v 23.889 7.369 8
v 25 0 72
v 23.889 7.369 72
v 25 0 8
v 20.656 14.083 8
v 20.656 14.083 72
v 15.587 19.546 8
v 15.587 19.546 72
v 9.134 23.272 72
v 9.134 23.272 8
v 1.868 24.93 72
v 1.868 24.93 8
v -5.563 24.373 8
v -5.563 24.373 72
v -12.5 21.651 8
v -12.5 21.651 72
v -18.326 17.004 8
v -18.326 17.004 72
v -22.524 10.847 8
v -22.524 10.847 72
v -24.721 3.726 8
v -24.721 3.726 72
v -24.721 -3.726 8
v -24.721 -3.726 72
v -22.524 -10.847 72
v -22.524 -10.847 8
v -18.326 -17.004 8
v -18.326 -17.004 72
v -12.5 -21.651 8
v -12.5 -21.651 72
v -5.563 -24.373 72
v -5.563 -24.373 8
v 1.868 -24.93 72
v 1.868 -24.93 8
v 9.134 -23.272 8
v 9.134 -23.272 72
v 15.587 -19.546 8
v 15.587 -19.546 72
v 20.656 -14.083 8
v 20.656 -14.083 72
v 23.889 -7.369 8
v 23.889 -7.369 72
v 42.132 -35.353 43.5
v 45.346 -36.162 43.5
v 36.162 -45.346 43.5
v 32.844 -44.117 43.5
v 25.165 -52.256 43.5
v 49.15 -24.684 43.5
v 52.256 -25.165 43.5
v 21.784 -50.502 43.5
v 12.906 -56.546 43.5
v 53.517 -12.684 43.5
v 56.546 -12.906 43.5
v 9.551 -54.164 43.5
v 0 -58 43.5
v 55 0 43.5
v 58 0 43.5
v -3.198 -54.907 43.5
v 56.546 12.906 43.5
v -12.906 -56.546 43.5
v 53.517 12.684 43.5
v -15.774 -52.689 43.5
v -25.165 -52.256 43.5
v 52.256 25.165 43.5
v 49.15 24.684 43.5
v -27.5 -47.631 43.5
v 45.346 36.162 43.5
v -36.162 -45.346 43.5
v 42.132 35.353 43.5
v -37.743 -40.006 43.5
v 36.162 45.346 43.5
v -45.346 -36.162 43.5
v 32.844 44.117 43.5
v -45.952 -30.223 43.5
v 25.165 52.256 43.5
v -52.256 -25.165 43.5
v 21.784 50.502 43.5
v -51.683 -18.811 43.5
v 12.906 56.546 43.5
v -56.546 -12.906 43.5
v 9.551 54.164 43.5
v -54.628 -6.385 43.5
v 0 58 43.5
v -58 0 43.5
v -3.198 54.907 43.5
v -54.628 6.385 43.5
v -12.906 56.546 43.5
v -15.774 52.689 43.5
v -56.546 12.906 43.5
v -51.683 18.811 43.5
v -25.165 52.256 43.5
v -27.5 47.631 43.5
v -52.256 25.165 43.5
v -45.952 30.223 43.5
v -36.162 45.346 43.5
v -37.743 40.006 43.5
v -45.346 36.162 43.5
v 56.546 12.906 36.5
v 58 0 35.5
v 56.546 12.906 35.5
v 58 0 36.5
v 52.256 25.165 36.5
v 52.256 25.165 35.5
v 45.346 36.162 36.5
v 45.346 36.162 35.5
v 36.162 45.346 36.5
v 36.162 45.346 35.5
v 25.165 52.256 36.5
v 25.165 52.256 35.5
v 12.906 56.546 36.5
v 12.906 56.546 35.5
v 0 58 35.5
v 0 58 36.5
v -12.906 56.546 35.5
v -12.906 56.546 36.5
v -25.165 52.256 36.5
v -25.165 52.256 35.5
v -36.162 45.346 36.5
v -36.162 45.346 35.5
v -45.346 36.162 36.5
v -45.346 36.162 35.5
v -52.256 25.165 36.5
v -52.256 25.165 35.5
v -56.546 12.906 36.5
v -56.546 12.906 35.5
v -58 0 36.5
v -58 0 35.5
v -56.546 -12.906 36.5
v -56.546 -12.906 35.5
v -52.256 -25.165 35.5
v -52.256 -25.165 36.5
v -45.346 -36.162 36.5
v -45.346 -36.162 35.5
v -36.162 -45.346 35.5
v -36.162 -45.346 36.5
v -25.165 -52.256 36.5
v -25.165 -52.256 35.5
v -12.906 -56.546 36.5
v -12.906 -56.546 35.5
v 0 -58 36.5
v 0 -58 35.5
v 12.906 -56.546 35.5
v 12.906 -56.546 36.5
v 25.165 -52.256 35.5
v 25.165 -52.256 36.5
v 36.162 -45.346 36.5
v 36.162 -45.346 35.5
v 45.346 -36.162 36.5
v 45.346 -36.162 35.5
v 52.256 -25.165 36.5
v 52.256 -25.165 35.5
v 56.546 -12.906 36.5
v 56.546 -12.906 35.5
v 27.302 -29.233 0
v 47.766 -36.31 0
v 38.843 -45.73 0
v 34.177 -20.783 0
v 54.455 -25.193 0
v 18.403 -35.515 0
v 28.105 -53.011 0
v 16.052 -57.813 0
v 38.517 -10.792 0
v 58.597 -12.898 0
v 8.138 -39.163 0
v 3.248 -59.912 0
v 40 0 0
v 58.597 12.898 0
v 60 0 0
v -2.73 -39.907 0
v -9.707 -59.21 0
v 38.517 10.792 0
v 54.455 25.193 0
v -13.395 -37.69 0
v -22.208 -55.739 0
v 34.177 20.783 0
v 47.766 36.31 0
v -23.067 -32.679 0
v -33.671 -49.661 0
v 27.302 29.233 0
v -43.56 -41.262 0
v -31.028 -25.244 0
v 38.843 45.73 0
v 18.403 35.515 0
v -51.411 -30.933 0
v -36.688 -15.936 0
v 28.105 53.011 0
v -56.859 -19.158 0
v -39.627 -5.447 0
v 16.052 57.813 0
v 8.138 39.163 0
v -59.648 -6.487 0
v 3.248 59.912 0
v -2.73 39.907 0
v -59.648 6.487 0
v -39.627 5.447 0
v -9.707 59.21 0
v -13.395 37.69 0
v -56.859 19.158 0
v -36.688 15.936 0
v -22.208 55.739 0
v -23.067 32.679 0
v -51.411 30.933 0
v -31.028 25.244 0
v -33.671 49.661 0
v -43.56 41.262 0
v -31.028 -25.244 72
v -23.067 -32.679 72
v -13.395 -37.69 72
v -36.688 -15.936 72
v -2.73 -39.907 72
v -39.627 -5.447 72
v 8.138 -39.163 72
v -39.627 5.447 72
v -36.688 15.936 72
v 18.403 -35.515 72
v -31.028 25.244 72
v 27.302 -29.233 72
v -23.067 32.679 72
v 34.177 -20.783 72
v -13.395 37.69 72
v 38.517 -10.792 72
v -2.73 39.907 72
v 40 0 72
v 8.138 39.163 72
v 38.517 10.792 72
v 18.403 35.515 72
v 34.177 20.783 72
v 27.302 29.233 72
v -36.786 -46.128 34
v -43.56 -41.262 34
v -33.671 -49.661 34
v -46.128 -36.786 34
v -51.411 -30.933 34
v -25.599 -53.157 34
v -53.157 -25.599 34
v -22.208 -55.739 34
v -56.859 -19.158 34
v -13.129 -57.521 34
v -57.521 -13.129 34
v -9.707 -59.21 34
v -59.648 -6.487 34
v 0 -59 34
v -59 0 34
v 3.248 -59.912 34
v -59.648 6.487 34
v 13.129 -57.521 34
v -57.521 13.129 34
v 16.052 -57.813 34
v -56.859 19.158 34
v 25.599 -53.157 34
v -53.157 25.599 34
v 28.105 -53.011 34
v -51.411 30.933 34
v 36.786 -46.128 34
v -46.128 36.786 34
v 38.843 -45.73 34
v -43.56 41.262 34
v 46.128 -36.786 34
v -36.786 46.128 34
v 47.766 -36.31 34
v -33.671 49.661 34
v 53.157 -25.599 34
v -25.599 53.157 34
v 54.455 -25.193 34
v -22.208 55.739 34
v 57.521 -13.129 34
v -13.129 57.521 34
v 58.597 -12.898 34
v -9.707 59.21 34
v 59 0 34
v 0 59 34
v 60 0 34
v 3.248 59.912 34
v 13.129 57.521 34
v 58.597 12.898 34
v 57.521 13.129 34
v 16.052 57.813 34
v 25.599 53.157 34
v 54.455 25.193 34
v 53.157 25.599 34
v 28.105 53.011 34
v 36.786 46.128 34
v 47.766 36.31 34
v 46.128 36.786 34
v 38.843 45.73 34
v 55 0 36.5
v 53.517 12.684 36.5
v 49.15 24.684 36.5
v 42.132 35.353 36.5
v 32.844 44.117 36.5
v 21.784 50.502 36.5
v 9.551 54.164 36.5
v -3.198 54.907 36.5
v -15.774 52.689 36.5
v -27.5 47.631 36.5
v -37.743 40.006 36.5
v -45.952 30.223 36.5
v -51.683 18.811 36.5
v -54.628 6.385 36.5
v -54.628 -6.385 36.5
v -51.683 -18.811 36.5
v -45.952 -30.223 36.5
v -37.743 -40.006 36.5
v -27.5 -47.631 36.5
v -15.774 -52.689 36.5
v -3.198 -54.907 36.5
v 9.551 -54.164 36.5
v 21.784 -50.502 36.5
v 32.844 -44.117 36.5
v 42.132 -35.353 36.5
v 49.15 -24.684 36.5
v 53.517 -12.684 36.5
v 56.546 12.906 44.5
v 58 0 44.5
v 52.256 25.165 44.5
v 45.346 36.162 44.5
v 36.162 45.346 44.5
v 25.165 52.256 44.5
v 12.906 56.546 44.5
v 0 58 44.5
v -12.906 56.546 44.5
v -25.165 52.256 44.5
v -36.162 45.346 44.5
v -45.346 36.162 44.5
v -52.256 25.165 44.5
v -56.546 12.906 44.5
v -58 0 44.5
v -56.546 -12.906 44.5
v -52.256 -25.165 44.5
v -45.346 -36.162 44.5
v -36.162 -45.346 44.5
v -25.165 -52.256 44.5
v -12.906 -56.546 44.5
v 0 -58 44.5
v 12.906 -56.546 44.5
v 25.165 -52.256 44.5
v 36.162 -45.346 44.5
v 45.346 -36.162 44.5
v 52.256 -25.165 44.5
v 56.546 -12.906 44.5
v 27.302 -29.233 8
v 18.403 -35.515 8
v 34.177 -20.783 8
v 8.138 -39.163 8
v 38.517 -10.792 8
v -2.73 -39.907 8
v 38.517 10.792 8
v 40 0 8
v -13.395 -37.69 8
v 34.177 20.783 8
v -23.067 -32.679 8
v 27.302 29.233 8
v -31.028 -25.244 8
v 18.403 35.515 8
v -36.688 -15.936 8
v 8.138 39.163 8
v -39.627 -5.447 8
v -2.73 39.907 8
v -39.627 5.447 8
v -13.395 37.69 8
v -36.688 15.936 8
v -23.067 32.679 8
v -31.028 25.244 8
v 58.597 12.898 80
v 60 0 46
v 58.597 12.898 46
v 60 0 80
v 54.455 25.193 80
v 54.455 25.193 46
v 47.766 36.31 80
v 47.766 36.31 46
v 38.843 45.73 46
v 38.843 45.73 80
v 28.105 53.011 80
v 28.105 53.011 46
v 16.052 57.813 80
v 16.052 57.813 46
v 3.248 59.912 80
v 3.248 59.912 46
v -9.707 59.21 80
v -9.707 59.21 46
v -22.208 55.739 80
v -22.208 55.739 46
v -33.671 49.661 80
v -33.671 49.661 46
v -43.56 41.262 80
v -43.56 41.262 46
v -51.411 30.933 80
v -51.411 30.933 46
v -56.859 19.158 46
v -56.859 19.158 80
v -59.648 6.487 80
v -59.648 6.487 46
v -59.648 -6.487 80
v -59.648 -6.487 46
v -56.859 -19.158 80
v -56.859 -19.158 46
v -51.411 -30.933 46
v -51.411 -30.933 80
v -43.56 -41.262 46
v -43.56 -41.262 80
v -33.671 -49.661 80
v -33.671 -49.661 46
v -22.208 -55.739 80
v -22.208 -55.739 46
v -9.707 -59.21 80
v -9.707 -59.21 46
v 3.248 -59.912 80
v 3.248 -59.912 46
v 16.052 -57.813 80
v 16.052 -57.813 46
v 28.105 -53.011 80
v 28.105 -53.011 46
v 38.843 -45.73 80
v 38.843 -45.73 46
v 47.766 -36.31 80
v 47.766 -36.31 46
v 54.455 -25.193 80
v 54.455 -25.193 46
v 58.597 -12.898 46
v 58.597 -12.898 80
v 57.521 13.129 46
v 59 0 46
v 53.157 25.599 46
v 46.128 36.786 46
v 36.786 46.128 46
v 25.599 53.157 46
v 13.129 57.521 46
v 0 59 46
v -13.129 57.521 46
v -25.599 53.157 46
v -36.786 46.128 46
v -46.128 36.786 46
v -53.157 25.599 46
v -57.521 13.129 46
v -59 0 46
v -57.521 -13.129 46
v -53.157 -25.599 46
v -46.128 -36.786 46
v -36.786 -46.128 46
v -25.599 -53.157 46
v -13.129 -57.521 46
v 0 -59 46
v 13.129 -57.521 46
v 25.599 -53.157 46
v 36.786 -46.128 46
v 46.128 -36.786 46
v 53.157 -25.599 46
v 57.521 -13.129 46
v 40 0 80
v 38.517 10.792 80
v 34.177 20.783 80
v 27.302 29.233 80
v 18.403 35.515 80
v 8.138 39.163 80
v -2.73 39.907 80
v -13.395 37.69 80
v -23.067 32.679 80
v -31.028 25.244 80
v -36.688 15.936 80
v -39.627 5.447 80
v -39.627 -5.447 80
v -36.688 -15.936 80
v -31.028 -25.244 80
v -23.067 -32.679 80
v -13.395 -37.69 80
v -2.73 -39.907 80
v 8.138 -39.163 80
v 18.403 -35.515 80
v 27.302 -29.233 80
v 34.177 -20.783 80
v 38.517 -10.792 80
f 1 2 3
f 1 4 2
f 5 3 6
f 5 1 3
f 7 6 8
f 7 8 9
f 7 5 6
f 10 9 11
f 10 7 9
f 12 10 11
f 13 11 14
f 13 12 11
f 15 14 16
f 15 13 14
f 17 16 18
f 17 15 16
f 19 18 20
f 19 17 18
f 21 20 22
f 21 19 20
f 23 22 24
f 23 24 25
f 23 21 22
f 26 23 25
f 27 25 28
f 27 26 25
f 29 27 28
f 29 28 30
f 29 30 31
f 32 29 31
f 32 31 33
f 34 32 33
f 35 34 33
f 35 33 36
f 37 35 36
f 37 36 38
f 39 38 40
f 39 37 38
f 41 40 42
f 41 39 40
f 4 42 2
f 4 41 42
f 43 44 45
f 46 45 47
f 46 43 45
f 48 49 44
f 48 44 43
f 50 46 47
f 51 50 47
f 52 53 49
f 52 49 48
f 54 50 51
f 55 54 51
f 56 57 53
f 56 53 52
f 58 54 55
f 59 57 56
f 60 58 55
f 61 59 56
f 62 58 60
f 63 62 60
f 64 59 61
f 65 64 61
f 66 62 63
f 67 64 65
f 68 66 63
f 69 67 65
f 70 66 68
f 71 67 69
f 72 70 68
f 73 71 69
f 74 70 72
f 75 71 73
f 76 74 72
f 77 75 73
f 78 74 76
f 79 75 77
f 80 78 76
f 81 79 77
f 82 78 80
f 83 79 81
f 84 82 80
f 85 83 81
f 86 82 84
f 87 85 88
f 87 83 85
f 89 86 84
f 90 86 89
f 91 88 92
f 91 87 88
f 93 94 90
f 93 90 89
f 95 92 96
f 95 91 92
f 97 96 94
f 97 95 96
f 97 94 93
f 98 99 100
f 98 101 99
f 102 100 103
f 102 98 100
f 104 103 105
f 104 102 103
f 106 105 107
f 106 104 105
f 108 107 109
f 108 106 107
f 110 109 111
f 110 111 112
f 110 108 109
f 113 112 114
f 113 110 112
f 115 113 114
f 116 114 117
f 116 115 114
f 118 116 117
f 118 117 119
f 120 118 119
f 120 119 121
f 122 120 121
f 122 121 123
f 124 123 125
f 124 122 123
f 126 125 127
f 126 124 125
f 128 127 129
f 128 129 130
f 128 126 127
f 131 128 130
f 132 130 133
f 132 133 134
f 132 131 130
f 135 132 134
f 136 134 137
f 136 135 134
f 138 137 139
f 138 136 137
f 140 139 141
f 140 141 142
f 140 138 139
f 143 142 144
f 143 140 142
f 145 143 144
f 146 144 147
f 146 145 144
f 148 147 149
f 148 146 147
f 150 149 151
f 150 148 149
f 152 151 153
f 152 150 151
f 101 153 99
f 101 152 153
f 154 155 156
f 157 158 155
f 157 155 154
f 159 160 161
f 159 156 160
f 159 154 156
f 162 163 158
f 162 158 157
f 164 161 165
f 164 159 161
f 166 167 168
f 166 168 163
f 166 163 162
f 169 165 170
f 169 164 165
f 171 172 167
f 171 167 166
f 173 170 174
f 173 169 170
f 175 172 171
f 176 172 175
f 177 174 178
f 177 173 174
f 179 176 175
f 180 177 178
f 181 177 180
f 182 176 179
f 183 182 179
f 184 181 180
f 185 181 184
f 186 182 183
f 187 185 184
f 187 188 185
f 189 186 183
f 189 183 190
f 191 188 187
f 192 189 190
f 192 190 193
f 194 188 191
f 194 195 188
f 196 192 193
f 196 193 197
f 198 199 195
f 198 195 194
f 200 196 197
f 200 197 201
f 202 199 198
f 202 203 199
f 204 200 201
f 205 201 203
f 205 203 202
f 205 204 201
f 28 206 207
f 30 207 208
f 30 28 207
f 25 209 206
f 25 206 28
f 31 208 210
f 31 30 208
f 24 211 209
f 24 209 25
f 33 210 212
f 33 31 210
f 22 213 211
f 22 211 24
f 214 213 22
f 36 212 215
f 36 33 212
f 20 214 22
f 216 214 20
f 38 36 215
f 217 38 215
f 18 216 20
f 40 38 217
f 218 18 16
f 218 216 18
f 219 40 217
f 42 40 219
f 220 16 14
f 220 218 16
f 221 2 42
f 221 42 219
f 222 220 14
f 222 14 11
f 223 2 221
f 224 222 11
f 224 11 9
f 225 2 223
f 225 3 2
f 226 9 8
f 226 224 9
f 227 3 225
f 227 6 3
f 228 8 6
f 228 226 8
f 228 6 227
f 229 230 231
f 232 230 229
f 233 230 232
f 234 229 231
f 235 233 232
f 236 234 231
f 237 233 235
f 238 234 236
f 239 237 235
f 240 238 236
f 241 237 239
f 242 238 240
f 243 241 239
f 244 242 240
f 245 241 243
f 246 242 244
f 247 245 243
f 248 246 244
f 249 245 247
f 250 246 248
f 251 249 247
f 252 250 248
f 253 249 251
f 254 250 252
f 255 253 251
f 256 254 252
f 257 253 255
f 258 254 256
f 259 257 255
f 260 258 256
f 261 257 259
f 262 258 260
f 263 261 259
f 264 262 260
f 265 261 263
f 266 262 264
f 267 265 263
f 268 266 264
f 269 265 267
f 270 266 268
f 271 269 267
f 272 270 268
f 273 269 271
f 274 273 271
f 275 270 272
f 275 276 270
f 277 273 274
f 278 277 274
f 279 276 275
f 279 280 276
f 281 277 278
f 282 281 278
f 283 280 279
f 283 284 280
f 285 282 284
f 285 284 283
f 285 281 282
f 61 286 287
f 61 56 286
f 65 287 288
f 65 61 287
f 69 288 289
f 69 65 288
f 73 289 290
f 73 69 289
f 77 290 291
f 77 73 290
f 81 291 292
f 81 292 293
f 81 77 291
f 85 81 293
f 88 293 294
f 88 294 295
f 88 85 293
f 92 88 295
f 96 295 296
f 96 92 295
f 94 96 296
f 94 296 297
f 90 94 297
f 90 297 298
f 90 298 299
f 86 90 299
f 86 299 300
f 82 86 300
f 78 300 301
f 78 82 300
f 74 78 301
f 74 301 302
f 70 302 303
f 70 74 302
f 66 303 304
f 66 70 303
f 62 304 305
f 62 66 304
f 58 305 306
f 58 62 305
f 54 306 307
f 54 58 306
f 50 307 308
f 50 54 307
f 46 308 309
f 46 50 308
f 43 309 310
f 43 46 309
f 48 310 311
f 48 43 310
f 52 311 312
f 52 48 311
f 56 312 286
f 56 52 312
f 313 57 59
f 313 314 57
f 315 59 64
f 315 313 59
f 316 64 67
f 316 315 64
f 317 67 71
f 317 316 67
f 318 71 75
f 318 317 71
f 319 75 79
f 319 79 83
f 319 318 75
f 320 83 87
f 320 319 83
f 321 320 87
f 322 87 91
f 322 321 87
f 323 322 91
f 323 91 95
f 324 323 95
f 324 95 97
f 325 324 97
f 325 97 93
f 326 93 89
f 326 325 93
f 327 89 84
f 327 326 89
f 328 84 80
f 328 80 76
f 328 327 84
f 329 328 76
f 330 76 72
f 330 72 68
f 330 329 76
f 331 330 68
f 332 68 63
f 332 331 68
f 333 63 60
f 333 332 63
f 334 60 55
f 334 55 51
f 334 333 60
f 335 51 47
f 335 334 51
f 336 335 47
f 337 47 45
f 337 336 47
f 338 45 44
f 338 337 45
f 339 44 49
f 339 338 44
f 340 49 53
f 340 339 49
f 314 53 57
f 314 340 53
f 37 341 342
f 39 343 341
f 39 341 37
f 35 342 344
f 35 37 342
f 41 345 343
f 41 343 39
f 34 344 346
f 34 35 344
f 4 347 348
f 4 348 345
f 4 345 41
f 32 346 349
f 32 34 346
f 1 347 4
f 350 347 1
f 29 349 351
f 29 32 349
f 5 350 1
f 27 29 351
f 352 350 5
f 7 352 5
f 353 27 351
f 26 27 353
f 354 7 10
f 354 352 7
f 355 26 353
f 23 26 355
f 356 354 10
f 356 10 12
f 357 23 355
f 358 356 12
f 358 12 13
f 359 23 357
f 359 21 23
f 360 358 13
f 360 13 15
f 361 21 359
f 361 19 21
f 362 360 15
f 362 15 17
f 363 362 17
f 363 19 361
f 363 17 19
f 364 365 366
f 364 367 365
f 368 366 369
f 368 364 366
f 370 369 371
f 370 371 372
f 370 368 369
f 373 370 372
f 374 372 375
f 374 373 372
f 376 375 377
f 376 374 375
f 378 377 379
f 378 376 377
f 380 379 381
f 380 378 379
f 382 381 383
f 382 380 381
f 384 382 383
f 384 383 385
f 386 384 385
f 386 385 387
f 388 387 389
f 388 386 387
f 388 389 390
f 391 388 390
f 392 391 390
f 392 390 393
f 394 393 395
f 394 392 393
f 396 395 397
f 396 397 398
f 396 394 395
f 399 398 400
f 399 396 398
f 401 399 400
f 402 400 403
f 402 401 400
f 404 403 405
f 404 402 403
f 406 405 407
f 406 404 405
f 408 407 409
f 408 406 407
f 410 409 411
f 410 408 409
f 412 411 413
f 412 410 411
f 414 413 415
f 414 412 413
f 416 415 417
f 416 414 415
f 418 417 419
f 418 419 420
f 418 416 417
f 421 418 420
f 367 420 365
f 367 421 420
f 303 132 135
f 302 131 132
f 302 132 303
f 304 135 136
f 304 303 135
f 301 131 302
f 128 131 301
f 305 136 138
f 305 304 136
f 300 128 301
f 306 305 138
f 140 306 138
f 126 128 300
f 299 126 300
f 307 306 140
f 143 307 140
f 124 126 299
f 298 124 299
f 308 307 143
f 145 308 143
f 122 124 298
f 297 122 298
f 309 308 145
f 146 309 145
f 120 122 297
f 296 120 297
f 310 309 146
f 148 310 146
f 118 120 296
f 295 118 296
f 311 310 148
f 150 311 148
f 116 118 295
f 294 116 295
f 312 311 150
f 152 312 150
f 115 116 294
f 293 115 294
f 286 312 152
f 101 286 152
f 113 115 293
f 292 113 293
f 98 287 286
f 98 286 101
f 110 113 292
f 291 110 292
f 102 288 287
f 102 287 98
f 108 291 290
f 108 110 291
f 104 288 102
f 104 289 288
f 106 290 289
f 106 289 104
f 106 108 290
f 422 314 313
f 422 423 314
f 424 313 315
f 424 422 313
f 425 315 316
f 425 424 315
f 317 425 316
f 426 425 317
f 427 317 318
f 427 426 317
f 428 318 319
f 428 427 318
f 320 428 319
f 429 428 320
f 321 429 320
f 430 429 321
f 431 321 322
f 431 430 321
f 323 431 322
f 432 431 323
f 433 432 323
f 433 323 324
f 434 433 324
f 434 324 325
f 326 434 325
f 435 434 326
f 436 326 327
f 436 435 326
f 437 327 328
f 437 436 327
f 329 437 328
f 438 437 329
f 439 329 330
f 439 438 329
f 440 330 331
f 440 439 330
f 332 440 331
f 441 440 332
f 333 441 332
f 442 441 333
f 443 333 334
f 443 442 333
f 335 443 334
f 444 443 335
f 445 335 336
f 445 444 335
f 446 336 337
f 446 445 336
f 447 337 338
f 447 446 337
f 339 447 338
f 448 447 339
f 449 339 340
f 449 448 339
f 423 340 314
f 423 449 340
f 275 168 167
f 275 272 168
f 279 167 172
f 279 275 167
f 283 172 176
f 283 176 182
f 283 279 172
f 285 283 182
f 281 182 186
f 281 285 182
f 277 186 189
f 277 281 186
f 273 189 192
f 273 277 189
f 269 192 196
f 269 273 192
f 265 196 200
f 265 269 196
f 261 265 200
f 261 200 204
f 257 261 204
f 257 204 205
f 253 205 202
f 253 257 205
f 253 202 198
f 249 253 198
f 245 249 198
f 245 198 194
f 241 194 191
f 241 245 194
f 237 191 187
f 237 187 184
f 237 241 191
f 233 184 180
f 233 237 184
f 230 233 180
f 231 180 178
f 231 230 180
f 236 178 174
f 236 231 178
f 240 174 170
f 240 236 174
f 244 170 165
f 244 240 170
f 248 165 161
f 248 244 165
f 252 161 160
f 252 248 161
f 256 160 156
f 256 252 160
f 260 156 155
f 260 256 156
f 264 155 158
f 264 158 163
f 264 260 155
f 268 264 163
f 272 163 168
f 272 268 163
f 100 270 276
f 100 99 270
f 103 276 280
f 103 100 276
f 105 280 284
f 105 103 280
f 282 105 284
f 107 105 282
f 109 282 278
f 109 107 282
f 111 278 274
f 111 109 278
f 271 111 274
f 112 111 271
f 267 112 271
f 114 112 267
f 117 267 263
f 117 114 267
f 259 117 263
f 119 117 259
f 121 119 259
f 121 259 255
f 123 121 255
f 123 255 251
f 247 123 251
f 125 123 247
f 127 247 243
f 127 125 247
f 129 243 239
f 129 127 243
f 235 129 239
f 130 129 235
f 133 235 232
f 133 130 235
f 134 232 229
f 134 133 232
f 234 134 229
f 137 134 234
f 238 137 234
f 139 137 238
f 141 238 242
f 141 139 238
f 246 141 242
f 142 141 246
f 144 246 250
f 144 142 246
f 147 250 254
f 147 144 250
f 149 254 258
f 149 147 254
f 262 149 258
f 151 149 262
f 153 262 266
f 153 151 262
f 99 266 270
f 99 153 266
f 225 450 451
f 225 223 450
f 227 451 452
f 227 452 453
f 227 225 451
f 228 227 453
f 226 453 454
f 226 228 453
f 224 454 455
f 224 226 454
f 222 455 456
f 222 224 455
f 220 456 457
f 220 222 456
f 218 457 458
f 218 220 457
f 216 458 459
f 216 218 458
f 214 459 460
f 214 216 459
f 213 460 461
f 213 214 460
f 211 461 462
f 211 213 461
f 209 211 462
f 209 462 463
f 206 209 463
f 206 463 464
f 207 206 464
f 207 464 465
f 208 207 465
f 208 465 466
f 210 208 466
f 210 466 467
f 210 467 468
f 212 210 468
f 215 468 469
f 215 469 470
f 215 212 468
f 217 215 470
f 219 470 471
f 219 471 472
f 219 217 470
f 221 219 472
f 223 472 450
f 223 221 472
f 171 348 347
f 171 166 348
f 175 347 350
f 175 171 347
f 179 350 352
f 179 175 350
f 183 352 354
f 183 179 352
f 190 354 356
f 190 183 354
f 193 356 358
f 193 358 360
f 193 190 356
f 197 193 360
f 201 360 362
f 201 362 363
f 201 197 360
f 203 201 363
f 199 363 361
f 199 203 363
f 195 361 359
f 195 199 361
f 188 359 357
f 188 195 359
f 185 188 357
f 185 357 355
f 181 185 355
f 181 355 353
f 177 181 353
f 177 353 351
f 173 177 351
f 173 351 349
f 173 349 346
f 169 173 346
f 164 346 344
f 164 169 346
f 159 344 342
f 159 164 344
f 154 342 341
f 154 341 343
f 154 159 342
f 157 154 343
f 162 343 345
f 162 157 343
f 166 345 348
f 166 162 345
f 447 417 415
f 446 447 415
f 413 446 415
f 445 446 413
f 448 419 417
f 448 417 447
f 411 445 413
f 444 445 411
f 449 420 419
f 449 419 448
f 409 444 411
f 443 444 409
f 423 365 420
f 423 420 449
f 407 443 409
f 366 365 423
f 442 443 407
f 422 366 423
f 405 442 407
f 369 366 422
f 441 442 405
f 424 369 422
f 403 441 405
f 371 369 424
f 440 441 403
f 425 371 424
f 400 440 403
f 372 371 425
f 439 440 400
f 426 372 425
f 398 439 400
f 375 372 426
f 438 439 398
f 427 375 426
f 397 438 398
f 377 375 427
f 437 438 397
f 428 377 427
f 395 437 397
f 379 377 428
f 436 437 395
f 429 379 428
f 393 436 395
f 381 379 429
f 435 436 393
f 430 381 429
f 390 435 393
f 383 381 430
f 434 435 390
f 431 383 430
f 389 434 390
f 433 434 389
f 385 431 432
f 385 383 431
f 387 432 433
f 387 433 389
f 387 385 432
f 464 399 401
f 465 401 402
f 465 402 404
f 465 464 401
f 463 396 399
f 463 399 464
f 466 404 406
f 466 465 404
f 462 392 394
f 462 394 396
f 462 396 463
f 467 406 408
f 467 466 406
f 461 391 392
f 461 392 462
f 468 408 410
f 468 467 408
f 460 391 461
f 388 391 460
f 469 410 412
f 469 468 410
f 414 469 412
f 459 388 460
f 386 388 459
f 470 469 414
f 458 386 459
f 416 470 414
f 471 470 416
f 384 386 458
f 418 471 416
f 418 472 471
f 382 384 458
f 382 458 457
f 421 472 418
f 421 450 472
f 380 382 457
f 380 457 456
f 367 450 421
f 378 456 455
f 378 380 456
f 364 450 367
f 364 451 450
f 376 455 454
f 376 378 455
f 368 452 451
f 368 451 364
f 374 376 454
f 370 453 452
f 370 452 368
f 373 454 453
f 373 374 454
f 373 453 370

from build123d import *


with BuildPart() as f1:
    # F0 (on Front) → F1 (revolve)
    with BuildSketch(Plane.XZ):
        Polygon((60, 80), (40, 80), (40, 72), (25, 72), (25, 8), (40, 8), (40, 0), (60, 0), (60, 34), (59, 34), (58, 35.5), (58, 36.5), (55, 36.5), (55, 43.5), (58, 43.5), (58, 44.5), (59, 46), (60, 46), align=None)
    revolve(axis=Axis((0, 0, 40), (0, 0, 1)))


solid = f1.part
